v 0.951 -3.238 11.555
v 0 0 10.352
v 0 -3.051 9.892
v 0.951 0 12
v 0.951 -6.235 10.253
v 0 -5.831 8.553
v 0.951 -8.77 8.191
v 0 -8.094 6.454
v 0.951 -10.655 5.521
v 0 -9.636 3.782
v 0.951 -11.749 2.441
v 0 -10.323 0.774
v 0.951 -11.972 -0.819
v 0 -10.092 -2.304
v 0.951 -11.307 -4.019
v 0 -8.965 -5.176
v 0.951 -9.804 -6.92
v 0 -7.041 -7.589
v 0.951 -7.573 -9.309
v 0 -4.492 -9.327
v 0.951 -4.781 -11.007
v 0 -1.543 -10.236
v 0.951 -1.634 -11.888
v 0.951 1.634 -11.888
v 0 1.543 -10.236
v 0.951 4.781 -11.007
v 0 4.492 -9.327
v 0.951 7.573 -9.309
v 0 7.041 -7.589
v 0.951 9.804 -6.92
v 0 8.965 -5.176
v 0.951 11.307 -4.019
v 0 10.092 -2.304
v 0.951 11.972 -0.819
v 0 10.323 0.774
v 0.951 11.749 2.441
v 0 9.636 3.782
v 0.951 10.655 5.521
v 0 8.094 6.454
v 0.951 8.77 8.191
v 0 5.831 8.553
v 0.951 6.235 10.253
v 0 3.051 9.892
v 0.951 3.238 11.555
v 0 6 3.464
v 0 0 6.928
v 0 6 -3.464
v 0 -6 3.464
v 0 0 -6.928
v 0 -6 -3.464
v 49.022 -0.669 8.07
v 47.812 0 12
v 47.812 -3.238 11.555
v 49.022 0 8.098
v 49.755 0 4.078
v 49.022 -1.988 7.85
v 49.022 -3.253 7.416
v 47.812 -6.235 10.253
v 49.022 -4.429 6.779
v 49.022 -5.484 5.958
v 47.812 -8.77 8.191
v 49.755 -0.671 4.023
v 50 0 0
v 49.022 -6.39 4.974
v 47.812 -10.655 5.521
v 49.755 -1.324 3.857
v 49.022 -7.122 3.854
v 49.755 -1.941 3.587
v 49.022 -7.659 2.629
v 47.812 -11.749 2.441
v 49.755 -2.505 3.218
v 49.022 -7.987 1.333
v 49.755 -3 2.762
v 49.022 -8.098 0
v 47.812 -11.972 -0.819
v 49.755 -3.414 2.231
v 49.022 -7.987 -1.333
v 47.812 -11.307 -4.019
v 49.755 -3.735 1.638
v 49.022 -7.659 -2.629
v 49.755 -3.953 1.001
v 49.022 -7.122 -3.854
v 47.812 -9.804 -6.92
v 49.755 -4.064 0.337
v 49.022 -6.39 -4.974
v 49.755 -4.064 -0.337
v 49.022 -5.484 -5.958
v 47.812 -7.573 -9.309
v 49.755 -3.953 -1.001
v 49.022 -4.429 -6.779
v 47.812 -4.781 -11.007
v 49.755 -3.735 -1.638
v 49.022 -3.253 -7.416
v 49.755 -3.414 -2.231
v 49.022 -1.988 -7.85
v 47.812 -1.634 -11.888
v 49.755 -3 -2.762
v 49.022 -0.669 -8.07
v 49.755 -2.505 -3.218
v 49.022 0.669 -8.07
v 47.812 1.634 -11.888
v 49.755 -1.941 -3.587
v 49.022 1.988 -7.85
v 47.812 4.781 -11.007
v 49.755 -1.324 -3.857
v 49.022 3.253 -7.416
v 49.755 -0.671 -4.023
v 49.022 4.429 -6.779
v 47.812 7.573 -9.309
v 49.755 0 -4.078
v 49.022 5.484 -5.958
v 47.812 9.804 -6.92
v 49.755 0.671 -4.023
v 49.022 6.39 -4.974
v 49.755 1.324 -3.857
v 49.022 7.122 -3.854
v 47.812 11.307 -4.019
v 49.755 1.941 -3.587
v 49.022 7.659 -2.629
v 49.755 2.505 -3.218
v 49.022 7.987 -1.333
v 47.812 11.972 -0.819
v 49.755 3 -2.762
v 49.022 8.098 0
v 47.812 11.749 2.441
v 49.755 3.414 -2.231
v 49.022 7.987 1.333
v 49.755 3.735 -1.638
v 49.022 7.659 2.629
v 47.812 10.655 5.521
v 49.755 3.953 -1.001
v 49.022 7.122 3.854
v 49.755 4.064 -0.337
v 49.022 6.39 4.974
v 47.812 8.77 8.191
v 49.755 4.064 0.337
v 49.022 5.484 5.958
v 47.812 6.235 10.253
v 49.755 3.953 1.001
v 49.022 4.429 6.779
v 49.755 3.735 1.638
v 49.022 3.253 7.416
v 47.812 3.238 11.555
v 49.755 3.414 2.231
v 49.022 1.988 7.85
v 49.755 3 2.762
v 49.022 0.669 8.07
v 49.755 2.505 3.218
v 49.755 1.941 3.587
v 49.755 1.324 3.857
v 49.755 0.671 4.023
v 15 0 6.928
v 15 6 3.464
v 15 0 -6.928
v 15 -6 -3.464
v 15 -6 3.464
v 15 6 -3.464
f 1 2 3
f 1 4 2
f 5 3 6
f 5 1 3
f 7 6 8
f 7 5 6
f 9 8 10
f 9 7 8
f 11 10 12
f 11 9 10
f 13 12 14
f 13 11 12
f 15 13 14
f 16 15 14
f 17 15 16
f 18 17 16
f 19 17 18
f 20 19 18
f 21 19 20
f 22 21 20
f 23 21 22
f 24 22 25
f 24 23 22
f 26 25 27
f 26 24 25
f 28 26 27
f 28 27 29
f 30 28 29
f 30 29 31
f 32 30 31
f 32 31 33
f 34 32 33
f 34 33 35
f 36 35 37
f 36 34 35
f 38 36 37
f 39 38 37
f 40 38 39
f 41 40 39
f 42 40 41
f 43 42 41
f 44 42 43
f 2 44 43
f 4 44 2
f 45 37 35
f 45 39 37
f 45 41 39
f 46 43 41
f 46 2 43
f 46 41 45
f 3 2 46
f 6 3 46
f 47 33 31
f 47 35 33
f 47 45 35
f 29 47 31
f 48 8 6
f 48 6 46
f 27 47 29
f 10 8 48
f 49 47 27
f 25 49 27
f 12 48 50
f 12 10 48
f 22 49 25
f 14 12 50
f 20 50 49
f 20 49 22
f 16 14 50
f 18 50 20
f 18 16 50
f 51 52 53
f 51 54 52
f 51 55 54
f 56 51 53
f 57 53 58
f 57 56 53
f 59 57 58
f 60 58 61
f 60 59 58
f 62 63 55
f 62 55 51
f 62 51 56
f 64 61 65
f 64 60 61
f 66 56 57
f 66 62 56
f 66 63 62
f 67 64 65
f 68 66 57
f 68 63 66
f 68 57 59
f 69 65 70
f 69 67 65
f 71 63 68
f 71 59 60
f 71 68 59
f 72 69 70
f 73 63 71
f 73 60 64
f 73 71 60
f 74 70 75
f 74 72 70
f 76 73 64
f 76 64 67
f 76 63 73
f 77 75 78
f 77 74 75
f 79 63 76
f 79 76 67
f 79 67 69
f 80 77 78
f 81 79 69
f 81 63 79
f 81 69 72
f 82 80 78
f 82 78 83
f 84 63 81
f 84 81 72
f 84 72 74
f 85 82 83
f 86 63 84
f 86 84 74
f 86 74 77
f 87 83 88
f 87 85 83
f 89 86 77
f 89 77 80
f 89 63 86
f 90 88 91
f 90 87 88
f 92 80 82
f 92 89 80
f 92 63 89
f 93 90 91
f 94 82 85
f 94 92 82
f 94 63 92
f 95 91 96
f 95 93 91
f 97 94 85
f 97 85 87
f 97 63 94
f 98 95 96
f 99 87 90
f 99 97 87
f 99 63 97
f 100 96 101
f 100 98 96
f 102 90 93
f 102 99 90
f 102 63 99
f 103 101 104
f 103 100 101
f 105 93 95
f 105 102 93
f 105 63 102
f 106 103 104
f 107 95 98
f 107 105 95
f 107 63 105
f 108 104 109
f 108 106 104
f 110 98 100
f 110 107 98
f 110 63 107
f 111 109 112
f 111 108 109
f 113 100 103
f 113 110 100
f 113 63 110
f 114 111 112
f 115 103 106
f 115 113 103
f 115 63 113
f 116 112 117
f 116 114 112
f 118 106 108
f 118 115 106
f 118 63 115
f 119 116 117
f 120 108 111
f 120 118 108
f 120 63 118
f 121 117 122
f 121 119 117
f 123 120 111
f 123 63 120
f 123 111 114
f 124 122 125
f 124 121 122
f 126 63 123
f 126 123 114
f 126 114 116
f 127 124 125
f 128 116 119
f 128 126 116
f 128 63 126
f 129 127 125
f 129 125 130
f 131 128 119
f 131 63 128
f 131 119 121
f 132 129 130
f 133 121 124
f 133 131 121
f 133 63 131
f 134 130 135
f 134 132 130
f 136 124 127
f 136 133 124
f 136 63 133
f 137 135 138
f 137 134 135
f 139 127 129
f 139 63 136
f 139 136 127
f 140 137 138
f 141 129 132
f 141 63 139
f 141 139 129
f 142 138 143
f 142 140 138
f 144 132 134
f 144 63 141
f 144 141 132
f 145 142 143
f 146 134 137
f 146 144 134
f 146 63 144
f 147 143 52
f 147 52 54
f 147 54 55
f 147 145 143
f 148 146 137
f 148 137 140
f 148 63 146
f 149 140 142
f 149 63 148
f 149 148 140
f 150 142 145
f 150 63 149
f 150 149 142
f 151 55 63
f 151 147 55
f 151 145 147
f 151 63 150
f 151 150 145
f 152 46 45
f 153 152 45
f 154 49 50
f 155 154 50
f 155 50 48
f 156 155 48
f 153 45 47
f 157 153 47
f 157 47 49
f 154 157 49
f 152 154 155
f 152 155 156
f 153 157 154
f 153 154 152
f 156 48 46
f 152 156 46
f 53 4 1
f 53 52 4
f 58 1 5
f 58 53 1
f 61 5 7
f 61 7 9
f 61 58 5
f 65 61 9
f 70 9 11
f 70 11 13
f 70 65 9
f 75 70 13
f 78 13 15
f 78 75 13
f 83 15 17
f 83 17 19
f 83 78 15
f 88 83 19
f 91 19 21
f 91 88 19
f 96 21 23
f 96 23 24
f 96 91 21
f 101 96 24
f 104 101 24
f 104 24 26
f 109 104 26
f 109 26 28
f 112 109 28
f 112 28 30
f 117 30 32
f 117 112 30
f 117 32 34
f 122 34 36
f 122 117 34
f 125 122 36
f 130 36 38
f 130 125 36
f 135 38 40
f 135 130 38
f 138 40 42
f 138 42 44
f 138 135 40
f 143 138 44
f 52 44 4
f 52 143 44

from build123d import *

# Parameters (mm, degrees)
HEX_2_DEPTH = 15


with BuildPart() as part:
    # BodySke → BaseBody (revolve)
    with BuildSketch(Plane.XY, mode=Mode.PRIVATE) as basebody_sk:
        with BuildLine():
            Line((0, 0), (0, 10.352))
            Line((0, 10.352), (0.951473244, 12))
            Line((0.951473244, 12), (47.811947441, 12))
            ThreePointArc((47.811947441, 12), (49.448514264, 6.098925602), (50, 0))
            Line((50, 0), (0, 0))
        make_face()
    revolve(basebody_sk.sketch.rotate(Axis((-12.7, 0, 0), (1, 0, 0)), 90), axis=Axis((-12.7, 0, 0), (1, 0, 0)))

    # Sketch2 → Hex 2 (cut)
    with BuildSketch(Plane.ZY):
        Polygon((3.464101615, 6), (-3.464101615, 6), (-6.92820323, 0), (-3.464101615, -6), (3.464101615, -6), (6.92820323, 0), align=None)
    extrude(amount=-HEX_2_DEPTH, mode=Mode.SUBTRACT)


solid = part.part
